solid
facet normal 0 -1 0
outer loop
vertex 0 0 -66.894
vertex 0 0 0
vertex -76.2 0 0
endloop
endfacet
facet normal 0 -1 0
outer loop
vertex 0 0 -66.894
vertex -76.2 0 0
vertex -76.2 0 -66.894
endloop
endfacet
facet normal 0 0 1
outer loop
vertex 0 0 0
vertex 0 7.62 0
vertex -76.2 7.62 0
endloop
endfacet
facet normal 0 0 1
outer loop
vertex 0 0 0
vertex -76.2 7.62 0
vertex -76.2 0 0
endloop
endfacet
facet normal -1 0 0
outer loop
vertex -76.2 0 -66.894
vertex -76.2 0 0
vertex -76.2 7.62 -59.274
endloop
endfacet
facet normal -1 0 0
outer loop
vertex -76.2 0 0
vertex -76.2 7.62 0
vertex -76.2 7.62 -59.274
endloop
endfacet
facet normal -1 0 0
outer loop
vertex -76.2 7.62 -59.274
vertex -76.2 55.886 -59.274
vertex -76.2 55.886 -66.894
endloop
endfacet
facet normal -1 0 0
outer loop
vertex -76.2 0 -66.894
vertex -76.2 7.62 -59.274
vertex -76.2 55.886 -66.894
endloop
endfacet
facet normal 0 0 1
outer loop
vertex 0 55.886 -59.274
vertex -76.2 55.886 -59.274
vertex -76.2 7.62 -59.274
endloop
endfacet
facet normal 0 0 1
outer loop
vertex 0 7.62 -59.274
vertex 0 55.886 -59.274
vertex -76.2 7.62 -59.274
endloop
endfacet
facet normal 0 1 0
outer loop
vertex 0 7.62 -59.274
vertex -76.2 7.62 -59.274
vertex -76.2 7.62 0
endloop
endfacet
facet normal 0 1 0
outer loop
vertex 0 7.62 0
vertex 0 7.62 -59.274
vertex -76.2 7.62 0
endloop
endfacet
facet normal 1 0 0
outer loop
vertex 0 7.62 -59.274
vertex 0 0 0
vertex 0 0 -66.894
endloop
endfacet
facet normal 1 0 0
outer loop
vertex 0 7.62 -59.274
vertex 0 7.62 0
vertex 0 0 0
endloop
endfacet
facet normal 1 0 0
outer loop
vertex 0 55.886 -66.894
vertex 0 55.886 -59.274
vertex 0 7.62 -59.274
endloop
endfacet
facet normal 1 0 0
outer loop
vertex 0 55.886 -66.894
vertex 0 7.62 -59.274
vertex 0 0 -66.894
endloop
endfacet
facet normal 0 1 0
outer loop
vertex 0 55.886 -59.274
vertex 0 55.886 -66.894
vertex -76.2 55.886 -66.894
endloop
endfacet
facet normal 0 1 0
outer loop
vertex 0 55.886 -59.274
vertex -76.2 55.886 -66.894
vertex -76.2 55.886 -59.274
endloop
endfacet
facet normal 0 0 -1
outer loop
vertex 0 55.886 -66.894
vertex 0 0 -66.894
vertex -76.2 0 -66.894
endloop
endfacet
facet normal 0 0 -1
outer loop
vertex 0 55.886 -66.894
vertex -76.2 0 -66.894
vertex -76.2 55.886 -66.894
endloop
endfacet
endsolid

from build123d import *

# Parameters (mm, degrees)
EXTRUDE1_DEPTH = 76.2


with BuildPart() as part:
    # Sketch1 → Extrude1 (new body)
    with BuildSketch(Plane(origin=(0, 0, 0), x_dir=(0, 0, -1), z_dir=(1, 0, 0))):
        Polygon((0, 0), (66.893951326, 0), (66.893951326, 55.885931794), (59.273951326, 55.885931794), (59.273951326, 7.62), (0, 7.62), align=None)
    extrude(amount=-EXTRUDE1_DEPTH)


solid = part.part
